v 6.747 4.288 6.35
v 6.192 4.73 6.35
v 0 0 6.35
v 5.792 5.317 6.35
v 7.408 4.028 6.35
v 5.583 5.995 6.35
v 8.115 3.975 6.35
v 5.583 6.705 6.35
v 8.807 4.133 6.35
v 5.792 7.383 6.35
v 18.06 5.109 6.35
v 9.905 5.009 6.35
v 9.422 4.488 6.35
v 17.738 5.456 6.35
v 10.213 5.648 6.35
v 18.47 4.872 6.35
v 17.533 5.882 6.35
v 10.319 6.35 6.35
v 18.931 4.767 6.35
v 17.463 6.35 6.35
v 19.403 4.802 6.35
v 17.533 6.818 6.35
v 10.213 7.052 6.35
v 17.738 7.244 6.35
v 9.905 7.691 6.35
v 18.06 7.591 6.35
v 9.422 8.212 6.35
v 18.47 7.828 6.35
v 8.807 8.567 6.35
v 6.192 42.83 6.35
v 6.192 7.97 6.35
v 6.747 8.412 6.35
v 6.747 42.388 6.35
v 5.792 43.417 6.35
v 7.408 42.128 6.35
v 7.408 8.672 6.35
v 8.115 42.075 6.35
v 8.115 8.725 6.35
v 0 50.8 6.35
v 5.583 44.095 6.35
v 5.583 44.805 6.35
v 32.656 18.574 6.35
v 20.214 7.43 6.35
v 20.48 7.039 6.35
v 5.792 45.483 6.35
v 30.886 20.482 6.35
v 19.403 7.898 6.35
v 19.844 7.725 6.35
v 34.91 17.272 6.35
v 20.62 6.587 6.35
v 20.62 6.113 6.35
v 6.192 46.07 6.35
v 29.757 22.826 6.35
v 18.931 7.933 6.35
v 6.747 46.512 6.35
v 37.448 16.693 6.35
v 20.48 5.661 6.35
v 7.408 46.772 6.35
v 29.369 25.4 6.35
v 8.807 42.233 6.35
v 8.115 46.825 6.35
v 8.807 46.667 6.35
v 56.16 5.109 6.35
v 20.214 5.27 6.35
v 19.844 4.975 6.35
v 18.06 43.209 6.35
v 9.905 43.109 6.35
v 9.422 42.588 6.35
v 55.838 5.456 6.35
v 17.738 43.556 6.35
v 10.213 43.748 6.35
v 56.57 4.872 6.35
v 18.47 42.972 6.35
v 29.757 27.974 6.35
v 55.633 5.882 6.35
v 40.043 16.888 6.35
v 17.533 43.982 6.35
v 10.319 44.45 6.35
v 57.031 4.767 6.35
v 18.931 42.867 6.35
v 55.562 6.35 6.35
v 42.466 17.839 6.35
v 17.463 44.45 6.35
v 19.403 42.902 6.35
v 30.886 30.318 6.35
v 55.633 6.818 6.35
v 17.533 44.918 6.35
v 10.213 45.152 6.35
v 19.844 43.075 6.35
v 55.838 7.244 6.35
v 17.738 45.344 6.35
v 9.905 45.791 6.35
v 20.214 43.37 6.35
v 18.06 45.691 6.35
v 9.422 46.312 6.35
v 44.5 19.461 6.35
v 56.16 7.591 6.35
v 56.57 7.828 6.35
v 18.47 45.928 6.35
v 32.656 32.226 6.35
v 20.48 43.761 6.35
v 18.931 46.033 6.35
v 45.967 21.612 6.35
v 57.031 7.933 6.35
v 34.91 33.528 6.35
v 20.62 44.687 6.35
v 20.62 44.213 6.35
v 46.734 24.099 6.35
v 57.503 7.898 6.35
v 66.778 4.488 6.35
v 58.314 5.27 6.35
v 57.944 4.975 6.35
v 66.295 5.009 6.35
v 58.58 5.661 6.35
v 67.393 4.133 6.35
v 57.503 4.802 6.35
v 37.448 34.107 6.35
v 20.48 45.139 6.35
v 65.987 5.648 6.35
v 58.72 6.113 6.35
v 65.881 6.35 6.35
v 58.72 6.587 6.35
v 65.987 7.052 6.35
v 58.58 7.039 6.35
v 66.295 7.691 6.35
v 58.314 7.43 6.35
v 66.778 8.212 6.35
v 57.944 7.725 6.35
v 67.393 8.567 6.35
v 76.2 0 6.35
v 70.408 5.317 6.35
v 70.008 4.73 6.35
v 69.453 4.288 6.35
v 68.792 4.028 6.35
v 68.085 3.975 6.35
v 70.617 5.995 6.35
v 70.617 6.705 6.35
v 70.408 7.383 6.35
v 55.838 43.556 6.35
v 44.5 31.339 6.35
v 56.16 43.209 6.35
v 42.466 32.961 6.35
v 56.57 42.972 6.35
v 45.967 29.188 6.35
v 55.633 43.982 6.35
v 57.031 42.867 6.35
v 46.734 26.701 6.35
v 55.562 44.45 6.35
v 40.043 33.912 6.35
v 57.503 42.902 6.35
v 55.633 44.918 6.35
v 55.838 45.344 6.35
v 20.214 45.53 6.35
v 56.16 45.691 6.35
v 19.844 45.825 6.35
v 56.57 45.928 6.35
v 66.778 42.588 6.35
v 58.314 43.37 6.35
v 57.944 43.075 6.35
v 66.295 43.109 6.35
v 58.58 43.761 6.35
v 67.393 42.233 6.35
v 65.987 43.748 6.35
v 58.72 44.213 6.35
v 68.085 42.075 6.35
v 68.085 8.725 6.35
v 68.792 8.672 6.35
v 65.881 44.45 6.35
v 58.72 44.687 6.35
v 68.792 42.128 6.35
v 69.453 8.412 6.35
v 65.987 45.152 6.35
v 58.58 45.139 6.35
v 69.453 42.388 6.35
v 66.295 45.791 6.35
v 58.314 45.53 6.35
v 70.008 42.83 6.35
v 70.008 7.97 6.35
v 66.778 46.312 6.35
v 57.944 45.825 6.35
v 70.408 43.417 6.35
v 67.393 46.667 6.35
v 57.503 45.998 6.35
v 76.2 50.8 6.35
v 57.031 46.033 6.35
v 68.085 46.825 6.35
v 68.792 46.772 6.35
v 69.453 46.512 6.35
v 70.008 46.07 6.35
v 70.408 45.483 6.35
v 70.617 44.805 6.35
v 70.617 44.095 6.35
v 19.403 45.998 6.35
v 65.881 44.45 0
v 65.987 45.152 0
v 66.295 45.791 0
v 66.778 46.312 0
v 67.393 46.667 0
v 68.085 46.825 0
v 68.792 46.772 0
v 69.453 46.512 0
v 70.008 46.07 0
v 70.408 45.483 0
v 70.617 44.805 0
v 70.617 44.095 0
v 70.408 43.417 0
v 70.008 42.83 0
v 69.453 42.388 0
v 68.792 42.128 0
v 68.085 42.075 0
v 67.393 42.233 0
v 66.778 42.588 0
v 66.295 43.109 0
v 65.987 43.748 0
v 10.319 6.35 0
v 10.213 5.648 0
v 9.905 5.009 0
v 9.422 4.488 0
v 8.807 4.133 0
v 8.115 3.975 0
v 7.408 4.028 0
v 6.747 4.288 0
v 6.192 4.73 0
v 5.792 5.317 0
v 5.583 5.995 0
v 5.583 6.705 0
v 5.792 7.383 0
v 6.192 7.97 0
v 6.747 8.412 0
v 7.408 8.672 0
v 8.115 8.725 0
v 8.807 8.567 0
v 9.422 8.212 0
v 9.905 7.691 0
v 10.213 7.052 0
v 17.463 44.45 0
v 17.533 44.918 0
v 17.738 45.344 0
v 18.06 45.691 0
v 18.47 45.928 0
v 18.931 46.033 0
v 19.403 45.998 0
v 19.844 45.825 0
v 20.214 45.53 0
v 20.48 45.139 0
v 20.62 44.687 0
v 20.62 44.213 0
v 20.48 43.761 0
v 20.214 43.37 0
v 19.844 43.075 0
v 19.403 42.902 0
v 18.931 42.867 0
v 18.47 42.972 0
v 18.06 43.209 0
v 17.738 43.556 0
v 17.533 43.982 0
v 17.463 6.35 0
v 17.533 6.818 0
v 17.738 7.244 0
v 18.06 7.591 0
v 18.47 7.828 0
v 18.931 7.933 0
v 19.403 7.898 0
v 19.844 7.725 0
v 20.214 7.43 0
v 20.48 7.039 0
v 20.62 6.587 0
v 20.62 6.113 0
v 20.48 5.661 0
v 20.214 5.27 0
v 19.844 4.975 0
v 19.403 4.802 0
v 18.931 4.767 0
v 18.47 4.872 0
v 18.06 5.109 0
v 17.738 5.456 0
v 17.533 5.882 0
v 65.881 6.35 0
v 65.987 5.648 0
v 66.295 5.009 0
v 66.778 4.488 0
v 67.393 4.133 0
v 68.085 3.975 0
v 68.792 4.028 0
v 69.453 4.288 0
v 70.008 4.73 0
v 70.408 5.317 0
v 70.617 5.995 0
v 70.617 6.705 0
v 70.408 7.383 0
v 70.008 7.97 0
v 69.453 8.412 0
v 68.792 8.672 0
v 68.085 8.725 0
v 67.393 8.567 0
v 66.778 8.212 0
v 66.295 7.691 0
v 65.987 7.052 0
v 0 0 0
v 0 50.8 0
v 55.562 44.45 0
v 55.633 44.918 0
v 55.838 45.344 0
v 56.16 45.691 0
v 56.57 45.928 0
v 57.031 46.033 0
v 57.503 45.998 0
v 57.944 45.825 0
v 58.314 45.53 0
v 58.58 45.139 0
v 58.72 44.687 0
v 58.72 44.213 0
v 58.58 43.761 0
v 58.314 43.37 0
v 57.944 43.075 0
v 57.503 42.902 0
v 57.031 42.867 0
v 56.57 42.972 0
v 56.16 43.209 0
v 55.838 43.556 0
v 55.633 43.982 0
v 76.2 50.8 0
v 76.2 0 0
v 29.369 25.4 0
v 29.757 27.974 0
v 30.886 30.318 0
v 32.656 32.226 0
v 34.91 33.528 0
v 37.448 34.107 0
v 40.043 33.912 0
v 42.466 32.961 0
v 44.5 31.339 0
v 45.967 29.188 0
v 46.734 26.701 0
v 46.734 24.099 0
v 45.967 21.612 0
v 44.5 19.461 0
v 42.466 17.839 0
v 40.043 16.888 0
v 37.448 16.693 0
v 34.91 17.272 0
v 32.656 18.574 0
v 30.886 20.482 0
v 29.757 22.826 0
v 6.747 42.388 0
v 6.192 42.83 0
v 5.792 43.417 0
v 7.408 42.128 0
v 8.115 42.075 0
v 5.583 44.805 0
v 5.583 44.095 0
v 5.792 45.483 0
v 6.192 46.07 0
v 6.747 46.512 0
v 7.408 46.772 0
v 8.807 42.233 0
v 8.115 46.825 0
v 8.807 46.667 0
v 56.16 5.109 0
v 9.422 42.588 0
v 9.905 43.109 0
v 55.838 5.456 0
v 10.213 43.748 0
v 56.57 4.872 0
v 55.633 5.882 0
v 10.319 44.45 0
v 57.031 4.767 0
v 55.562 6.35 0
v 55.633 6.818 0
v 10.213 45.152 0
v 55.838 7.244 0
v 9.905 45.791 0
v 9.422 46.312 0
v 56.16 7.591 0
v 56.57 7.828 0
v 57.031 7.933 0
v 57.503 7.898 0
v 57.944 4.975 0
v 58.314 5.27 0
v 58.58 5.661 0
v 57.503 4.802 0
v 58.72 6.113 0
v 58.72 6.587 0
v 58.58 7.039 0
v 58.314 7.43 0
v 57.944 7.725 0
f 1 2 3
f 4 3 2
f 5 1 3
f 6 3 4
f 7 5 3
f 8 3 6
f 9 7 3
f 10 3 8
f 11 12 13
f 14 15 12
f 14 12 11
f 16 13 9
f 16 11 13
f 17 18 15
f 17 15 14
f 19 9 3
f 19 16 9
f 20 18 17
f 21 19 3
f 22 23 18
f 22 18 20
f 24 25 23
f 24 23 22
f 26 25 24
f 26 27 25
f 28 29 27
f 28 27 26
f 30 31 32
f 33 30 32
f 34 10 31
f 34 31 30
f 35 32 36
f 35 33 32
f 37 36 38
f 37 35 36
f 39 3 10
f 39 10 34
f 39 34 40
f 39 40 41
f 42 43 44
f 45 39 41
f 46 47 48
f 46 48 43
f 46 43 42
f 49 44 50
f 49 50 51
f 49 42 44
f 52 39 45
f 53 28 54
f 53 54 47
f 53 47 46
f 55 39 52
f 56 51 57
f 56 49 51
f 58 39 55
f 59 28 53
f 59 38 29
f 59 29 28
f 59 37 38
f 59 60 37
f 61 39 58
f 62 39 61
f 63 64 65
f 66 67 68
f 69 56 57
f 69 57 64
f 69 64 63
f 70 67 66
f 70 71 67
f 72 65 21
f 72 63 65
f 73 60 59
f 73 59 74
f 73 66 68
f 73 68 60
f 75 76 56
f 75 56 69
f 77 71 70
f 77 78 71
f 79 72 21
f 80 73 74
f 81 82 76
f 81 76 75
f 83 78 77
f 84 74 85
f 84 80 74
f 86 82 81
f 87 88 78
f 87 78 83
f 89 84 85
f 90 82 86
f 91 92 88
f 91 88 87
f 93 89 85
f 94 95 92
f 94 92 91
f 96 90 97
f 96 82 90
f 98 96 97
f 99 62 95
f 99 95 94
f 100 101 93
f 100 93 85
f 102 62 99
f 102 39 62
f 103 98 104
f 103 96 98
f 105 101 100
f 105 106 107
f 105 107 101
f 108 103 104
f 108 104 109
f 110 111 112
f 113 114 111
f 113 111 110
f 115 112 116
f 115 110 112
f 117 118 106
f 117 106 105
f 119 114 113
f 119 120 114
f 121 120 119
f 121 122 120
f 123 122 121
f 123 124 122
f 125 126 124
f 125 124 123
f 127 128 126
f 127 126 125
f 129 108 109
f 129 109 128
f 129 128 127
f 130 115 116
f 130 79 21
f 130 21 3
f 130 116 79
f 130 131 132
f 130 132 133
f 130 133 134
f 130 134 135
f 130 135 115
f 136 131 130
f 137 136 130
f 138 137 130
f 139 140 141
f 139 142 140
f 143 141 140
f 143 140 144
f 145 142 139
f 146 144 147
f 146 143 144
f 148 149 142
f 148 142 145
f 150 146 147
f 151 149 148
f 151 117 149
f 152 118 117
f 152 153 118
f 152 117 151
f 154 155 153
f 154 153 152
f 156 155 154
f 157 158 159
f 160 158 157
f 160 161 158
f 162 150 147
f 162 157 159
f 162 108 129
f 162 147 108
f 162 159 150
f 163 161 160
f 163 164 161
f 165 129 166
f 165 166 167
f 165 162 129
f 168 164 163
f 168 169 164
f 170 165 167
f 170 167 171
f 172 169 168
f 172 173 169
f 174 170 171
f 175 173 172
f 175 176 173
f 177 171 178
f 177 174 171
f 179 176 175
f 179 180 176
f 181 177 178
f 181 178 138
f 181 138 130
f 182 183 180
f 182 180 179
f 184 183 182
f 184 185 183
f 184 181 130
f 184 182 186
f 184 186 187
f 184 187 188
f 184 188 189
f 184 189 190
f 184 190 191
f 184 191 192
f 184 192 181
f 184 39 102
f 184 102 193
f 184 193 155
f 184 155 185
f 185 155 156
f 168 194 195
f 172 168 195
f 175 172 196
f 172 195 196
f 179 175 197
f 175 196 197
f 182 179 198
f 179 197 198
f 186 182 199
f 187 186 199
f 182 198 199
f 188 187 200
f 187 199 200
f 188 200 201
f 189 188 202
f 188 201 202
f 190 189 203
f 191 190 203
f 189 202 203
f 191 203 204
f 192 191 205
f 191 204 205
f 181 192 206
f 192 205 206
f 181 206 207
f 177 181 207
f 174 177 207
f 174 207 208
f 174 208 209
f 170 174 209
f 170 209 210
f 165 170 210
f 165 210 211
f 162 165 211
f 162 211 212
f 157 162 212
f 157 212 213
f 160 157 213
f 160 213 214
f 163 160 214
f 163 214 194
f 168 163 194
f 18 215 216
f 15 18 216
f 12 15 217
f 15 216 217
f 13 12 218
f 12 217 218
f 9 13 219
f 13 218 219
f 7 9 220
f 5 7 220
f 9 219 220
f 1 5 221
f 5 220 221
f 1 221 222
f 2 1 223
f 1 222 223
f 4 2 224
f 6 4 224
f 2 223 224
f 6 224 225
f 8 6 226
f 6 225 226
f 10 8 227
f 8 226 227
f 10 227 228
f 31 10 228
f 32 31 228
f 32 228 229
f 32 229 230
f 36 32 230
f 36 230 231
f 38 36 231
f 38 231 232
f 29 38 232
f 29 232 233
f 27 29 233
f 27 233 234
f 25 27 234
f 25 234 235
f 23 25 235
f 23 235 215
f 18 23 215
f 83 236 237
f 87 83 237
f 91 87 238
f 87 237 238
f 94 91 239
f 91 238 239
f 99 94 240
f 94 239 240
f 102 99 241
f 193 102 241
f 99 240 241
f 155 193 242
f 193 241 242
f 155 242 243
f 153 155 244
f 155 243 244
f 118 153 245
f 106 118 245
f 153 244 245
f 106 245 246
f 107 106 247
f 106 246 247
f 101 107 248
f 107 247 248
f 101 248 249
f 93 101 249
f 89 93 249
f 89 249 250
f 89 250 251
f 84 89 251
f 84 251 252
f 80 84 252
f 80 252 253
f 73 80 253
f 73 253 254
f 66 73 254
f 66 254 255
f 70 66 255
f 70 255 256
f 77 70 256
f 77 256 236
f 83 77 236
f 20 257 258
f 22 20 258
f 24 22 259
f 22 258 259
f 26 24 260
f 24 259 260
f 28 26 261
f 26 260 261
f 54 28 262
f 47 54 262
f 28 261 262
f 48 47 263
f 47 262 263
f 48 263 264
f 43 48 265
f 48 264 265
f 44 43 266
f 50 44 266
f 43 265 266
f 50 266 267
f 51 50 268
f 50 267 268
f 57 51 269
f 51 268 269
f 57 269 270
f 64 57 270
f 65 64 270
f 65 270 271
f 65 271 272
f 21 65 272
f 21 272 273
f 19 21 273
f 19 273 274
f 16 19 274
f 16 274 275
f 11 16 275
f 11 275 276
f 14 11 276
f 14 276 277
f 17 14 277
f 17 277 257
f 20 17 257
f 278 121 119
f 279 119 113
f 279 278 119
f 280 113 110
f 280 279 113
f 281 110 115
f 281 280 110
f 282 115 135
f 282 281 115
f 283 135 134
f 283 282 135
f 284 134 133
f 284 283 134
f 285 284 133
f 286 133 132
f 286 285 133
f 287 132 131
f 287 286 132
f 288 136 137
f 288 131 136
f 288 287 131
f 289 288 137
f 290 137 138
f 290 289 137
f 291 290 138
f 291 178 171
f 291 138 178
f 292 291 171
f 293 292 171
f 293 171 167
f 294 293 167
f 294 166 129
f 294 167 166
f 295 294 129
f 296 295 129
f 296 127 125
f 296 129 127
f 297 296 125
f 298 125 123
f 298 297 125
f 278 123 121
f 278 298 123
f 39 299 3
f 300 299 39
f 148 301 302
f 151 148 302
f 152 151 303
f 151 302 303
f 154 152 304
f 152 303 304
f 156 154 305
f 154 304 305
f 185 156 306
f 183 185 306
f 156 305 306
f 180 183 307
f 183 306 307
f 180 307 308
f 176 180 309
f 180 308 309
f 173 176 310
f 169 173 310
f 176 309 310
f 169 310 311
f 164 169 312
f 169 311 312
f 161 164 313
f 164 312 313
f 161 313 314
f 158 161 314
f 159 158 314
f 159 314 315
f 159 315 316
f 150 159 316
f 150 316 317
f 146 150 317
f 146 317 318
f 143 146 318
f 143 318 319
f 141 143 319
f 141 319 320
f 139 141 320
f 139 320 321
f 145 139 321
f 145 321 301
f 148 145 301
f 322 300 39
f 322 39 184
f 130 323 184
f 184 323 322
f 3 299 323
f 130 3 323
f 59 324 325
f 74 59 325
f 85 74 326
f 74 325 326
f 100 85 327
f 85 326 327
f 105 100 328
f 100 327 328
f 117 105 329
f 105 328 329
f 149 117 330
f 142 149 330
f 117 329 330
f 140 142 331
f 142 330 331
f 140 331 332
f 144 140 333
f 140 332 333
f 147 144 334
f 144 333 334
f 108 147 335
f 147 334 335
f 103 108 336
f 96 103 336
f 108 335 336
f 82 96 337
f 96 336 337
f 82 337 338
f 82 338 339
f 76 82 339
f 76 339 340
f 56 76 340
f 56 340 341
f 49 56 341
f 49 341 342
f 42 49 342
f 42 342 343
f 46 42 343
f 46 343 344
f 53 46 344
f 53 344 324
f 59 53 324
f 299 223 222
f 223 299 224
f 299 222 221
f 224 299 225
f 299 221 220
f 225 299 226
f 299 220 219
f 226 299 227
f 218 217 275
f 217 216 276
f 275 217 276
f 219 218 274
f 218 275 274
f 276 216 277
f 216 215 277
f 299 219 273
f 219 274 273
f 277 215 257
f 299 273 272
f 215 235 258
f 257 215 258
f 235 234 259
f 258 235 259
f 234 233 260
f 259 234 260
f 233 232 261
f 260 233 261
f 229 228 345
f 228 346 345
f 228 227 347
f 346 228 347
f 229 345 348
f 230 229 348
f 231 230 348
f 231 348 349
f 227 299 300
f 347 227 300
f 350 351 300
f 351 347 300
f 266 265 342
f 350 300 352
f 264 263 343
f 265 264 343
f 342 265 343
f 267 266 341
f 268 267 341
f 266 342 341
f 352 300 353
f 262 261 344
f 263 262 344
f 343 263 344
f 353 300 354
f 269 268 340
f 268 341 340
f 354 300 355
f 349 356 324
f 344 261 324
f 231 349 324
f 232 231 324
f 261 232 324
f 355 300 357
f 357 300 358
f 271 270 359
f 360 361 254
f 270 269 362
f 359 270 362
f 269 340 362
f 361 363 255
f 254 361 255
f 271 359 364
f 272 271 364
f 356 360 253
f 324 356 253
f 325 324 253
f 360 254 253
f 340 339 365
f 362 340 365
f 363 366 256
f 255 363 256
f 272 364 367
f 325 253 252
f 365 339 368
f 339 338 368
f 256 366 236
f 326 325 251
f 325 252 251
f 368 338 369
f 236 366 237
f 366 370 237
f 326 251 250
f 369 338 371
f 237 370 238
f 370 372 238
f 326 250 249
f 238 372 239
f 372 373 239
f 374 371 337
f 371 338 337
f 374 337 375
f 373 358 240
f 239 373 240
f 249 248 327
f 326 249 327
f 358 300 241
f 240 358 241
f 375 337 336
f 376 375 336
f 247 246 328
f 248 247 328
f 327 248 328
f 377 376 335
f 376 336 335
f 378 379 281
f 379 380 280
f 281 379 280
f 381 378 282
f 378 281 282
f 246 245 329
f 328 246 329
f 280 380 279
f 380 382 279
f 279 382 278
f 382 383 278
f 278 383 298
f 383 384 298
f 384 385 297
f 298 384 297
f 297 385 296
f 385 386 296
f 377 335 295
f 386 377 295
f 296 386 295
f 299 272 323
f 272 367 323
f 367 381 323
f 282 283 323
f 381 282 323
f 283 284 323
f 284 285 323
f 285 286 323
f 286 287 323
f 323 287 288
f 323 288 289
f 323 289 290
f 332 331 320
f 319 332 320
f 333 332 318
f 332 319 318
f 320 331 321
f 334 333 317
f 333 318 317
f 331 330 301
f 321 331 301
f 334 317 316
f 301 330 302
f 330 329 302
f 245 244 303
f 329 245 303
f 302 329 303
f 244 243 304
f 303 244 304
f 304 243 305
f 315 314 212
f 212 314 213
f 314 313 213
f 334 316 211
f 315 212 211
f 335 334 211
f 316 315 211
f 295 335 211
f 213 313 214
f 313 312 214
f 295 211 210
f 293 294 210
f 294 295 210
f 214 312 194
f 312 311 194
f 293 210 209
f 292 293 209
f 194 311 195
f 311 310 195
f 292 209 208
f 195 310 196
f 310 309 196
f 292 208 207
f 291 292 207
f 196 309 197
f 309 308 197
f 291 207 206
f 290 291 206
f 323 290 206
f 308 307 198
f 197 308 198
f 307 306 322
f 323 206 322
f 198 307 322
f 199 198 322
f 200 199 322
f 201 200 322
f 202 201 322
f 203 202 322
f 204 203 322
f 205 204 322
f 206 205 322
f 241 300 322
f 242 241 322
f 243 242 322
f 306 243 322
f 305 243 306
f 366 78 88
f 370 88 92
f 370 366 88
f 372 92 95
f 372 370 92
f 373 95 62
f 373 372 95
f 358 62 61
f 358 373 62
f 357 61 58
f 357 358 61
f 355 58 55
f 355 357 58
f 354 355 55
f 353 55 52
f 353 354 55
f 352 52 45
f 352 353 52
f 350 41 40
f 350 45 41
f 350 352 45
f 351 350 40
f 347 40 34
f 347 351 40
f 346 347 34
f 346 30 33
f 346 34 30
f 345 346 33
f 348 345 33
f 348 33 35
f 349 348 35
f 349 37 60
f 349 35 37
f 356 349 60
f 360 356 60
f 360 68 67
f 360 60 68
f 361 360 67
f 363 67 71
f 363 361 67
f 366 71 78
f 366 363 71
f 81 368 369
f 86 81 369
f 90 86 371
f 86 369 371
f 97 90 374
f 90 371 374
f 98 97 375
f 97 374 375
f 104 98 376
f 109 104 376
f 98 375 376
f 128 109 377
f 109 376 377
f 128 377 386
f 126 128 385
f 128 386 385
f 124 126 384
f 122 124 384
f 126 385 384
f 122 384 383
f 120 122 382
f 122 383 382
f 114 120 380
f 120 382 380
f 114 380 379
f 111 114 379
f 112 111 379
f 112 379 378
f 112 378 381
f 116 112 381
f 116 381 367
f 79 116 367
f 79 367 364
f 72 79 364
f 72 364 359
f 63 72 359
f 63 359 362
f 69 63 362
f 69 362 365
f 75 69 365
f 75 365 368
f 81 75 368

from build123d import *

# Parameters (mm, degrees)
SKETCH1_W               = 76.2
SKETCH1_H               = 50.8
BOSS_EXTRUDE1_DEPTH     = 6.35
SKETCH3_R               = 2.38125
CUT_EXTRUDE6_DEPTH      = 7.35
MIRROR2_COPY_1_SKETCH_R = 2.38125
MIRROR2_COPY_1_DEPTH    = 7.35
SKETCH2_R               = 8.73125
CUT_EXTRUDE7_DEPTH      = 7.35
SKETCH5_R               = 1.5875
CUT_EXTRUDE8_DEPTH      = 7.35


with BuildPart() as part:
    # Sketch1 → Boss-Extrude1 (new body)
    with BuildSketch(Plane.XY):
        with Locations((38.1, 25.4)):
            Rectangle(SKETCH1_W, SKETCH1_H)
    extrude(amount=BOSS_EXTRUDE1_DEPTH)

    # Sketch3 → Cut-Extrude6 (cut, through all)
    with BuildSketch(Plane(origin=(0, 0, 0), x_dir=(-1, 0, 0), z_dir=(0, 0, -1))):
        with Locations((-68.2625, 44.45)):
            Circle(SKETCH3_R)
    cut_extrude6 = extrude(amount=-CUT_EXTRUDE6_DEPTH, mode=Mode.SUBTRACT)

    # Mirror1: Cut-Extrude6 across plane
    add(cut_extrude6.mirror(Plane(origin=(38.1, 0, 0), x_dir=(0, 0, 1), z_dir=(1, 0, 0))), mode=Mode.SUBTRACT)

    # Mirror2: Cut-Extrude6 across plane
    add(cut_extrude6.mirror(Plane(origin=(0, 25.4, 0), x_dir=(0, 0, 1), z_dir=(0, -1, 0))), mode=Mode.SUBTRACT)

    # Mirror2 copy 1 sketch → Mirror2 copy 1 (cut, through all)
    with BuildSketch(Plane(origin=(76.2, 50.8, 0), x_dir=(1, 0, 0), z_dir=(0, 0, -1))):
        with Locations((-68.2625, 44.45)):
            Circle(MIRROR2_COPY_1_SKETCH_R)
    extrude(amount=-MIRROR2_COPY_1_DEPTH, mode=Mode.SUBTRACT)

    # Sketch2 → Cut-Extrude7 (cut, through all)
    with BuildSketch(Plane(origin=(0, 0, 0), x_dir=(-1, 0, 0), z_dir=(0, 0, -1))):
        with Locations((-38.1, 25.4)):
            Circle(SKETCH2_R)
    extrude(amount=-CUT_EXTRUDE7_DEPTH, mode=Mode.SUBTRACT)

    # Sketch5 → Cut-Extrude8 (cut, through all)
    with BuildSketch(Plane(origin=(0, 0, 0), x_dir=(-1, 0, 0), z_dir=(0, 0, -1))):
        with Locations((-19.05, 44.45)):
            Circle(SKETCH5_R)
        with Locations((-19.05, 6.35)):
            Circle(SKETCH5_R)
        with Locations((-57.15, 44.45)):
            Circle(SKETCH5_R)
        with Locations((-57.15, 6.35)):
            Circle(SKETCH5_R)
    extrude(amount=-CUT_EXTRUDE8_DEPTH, mode=Mode.SUBTRACT)


solid = part.part
